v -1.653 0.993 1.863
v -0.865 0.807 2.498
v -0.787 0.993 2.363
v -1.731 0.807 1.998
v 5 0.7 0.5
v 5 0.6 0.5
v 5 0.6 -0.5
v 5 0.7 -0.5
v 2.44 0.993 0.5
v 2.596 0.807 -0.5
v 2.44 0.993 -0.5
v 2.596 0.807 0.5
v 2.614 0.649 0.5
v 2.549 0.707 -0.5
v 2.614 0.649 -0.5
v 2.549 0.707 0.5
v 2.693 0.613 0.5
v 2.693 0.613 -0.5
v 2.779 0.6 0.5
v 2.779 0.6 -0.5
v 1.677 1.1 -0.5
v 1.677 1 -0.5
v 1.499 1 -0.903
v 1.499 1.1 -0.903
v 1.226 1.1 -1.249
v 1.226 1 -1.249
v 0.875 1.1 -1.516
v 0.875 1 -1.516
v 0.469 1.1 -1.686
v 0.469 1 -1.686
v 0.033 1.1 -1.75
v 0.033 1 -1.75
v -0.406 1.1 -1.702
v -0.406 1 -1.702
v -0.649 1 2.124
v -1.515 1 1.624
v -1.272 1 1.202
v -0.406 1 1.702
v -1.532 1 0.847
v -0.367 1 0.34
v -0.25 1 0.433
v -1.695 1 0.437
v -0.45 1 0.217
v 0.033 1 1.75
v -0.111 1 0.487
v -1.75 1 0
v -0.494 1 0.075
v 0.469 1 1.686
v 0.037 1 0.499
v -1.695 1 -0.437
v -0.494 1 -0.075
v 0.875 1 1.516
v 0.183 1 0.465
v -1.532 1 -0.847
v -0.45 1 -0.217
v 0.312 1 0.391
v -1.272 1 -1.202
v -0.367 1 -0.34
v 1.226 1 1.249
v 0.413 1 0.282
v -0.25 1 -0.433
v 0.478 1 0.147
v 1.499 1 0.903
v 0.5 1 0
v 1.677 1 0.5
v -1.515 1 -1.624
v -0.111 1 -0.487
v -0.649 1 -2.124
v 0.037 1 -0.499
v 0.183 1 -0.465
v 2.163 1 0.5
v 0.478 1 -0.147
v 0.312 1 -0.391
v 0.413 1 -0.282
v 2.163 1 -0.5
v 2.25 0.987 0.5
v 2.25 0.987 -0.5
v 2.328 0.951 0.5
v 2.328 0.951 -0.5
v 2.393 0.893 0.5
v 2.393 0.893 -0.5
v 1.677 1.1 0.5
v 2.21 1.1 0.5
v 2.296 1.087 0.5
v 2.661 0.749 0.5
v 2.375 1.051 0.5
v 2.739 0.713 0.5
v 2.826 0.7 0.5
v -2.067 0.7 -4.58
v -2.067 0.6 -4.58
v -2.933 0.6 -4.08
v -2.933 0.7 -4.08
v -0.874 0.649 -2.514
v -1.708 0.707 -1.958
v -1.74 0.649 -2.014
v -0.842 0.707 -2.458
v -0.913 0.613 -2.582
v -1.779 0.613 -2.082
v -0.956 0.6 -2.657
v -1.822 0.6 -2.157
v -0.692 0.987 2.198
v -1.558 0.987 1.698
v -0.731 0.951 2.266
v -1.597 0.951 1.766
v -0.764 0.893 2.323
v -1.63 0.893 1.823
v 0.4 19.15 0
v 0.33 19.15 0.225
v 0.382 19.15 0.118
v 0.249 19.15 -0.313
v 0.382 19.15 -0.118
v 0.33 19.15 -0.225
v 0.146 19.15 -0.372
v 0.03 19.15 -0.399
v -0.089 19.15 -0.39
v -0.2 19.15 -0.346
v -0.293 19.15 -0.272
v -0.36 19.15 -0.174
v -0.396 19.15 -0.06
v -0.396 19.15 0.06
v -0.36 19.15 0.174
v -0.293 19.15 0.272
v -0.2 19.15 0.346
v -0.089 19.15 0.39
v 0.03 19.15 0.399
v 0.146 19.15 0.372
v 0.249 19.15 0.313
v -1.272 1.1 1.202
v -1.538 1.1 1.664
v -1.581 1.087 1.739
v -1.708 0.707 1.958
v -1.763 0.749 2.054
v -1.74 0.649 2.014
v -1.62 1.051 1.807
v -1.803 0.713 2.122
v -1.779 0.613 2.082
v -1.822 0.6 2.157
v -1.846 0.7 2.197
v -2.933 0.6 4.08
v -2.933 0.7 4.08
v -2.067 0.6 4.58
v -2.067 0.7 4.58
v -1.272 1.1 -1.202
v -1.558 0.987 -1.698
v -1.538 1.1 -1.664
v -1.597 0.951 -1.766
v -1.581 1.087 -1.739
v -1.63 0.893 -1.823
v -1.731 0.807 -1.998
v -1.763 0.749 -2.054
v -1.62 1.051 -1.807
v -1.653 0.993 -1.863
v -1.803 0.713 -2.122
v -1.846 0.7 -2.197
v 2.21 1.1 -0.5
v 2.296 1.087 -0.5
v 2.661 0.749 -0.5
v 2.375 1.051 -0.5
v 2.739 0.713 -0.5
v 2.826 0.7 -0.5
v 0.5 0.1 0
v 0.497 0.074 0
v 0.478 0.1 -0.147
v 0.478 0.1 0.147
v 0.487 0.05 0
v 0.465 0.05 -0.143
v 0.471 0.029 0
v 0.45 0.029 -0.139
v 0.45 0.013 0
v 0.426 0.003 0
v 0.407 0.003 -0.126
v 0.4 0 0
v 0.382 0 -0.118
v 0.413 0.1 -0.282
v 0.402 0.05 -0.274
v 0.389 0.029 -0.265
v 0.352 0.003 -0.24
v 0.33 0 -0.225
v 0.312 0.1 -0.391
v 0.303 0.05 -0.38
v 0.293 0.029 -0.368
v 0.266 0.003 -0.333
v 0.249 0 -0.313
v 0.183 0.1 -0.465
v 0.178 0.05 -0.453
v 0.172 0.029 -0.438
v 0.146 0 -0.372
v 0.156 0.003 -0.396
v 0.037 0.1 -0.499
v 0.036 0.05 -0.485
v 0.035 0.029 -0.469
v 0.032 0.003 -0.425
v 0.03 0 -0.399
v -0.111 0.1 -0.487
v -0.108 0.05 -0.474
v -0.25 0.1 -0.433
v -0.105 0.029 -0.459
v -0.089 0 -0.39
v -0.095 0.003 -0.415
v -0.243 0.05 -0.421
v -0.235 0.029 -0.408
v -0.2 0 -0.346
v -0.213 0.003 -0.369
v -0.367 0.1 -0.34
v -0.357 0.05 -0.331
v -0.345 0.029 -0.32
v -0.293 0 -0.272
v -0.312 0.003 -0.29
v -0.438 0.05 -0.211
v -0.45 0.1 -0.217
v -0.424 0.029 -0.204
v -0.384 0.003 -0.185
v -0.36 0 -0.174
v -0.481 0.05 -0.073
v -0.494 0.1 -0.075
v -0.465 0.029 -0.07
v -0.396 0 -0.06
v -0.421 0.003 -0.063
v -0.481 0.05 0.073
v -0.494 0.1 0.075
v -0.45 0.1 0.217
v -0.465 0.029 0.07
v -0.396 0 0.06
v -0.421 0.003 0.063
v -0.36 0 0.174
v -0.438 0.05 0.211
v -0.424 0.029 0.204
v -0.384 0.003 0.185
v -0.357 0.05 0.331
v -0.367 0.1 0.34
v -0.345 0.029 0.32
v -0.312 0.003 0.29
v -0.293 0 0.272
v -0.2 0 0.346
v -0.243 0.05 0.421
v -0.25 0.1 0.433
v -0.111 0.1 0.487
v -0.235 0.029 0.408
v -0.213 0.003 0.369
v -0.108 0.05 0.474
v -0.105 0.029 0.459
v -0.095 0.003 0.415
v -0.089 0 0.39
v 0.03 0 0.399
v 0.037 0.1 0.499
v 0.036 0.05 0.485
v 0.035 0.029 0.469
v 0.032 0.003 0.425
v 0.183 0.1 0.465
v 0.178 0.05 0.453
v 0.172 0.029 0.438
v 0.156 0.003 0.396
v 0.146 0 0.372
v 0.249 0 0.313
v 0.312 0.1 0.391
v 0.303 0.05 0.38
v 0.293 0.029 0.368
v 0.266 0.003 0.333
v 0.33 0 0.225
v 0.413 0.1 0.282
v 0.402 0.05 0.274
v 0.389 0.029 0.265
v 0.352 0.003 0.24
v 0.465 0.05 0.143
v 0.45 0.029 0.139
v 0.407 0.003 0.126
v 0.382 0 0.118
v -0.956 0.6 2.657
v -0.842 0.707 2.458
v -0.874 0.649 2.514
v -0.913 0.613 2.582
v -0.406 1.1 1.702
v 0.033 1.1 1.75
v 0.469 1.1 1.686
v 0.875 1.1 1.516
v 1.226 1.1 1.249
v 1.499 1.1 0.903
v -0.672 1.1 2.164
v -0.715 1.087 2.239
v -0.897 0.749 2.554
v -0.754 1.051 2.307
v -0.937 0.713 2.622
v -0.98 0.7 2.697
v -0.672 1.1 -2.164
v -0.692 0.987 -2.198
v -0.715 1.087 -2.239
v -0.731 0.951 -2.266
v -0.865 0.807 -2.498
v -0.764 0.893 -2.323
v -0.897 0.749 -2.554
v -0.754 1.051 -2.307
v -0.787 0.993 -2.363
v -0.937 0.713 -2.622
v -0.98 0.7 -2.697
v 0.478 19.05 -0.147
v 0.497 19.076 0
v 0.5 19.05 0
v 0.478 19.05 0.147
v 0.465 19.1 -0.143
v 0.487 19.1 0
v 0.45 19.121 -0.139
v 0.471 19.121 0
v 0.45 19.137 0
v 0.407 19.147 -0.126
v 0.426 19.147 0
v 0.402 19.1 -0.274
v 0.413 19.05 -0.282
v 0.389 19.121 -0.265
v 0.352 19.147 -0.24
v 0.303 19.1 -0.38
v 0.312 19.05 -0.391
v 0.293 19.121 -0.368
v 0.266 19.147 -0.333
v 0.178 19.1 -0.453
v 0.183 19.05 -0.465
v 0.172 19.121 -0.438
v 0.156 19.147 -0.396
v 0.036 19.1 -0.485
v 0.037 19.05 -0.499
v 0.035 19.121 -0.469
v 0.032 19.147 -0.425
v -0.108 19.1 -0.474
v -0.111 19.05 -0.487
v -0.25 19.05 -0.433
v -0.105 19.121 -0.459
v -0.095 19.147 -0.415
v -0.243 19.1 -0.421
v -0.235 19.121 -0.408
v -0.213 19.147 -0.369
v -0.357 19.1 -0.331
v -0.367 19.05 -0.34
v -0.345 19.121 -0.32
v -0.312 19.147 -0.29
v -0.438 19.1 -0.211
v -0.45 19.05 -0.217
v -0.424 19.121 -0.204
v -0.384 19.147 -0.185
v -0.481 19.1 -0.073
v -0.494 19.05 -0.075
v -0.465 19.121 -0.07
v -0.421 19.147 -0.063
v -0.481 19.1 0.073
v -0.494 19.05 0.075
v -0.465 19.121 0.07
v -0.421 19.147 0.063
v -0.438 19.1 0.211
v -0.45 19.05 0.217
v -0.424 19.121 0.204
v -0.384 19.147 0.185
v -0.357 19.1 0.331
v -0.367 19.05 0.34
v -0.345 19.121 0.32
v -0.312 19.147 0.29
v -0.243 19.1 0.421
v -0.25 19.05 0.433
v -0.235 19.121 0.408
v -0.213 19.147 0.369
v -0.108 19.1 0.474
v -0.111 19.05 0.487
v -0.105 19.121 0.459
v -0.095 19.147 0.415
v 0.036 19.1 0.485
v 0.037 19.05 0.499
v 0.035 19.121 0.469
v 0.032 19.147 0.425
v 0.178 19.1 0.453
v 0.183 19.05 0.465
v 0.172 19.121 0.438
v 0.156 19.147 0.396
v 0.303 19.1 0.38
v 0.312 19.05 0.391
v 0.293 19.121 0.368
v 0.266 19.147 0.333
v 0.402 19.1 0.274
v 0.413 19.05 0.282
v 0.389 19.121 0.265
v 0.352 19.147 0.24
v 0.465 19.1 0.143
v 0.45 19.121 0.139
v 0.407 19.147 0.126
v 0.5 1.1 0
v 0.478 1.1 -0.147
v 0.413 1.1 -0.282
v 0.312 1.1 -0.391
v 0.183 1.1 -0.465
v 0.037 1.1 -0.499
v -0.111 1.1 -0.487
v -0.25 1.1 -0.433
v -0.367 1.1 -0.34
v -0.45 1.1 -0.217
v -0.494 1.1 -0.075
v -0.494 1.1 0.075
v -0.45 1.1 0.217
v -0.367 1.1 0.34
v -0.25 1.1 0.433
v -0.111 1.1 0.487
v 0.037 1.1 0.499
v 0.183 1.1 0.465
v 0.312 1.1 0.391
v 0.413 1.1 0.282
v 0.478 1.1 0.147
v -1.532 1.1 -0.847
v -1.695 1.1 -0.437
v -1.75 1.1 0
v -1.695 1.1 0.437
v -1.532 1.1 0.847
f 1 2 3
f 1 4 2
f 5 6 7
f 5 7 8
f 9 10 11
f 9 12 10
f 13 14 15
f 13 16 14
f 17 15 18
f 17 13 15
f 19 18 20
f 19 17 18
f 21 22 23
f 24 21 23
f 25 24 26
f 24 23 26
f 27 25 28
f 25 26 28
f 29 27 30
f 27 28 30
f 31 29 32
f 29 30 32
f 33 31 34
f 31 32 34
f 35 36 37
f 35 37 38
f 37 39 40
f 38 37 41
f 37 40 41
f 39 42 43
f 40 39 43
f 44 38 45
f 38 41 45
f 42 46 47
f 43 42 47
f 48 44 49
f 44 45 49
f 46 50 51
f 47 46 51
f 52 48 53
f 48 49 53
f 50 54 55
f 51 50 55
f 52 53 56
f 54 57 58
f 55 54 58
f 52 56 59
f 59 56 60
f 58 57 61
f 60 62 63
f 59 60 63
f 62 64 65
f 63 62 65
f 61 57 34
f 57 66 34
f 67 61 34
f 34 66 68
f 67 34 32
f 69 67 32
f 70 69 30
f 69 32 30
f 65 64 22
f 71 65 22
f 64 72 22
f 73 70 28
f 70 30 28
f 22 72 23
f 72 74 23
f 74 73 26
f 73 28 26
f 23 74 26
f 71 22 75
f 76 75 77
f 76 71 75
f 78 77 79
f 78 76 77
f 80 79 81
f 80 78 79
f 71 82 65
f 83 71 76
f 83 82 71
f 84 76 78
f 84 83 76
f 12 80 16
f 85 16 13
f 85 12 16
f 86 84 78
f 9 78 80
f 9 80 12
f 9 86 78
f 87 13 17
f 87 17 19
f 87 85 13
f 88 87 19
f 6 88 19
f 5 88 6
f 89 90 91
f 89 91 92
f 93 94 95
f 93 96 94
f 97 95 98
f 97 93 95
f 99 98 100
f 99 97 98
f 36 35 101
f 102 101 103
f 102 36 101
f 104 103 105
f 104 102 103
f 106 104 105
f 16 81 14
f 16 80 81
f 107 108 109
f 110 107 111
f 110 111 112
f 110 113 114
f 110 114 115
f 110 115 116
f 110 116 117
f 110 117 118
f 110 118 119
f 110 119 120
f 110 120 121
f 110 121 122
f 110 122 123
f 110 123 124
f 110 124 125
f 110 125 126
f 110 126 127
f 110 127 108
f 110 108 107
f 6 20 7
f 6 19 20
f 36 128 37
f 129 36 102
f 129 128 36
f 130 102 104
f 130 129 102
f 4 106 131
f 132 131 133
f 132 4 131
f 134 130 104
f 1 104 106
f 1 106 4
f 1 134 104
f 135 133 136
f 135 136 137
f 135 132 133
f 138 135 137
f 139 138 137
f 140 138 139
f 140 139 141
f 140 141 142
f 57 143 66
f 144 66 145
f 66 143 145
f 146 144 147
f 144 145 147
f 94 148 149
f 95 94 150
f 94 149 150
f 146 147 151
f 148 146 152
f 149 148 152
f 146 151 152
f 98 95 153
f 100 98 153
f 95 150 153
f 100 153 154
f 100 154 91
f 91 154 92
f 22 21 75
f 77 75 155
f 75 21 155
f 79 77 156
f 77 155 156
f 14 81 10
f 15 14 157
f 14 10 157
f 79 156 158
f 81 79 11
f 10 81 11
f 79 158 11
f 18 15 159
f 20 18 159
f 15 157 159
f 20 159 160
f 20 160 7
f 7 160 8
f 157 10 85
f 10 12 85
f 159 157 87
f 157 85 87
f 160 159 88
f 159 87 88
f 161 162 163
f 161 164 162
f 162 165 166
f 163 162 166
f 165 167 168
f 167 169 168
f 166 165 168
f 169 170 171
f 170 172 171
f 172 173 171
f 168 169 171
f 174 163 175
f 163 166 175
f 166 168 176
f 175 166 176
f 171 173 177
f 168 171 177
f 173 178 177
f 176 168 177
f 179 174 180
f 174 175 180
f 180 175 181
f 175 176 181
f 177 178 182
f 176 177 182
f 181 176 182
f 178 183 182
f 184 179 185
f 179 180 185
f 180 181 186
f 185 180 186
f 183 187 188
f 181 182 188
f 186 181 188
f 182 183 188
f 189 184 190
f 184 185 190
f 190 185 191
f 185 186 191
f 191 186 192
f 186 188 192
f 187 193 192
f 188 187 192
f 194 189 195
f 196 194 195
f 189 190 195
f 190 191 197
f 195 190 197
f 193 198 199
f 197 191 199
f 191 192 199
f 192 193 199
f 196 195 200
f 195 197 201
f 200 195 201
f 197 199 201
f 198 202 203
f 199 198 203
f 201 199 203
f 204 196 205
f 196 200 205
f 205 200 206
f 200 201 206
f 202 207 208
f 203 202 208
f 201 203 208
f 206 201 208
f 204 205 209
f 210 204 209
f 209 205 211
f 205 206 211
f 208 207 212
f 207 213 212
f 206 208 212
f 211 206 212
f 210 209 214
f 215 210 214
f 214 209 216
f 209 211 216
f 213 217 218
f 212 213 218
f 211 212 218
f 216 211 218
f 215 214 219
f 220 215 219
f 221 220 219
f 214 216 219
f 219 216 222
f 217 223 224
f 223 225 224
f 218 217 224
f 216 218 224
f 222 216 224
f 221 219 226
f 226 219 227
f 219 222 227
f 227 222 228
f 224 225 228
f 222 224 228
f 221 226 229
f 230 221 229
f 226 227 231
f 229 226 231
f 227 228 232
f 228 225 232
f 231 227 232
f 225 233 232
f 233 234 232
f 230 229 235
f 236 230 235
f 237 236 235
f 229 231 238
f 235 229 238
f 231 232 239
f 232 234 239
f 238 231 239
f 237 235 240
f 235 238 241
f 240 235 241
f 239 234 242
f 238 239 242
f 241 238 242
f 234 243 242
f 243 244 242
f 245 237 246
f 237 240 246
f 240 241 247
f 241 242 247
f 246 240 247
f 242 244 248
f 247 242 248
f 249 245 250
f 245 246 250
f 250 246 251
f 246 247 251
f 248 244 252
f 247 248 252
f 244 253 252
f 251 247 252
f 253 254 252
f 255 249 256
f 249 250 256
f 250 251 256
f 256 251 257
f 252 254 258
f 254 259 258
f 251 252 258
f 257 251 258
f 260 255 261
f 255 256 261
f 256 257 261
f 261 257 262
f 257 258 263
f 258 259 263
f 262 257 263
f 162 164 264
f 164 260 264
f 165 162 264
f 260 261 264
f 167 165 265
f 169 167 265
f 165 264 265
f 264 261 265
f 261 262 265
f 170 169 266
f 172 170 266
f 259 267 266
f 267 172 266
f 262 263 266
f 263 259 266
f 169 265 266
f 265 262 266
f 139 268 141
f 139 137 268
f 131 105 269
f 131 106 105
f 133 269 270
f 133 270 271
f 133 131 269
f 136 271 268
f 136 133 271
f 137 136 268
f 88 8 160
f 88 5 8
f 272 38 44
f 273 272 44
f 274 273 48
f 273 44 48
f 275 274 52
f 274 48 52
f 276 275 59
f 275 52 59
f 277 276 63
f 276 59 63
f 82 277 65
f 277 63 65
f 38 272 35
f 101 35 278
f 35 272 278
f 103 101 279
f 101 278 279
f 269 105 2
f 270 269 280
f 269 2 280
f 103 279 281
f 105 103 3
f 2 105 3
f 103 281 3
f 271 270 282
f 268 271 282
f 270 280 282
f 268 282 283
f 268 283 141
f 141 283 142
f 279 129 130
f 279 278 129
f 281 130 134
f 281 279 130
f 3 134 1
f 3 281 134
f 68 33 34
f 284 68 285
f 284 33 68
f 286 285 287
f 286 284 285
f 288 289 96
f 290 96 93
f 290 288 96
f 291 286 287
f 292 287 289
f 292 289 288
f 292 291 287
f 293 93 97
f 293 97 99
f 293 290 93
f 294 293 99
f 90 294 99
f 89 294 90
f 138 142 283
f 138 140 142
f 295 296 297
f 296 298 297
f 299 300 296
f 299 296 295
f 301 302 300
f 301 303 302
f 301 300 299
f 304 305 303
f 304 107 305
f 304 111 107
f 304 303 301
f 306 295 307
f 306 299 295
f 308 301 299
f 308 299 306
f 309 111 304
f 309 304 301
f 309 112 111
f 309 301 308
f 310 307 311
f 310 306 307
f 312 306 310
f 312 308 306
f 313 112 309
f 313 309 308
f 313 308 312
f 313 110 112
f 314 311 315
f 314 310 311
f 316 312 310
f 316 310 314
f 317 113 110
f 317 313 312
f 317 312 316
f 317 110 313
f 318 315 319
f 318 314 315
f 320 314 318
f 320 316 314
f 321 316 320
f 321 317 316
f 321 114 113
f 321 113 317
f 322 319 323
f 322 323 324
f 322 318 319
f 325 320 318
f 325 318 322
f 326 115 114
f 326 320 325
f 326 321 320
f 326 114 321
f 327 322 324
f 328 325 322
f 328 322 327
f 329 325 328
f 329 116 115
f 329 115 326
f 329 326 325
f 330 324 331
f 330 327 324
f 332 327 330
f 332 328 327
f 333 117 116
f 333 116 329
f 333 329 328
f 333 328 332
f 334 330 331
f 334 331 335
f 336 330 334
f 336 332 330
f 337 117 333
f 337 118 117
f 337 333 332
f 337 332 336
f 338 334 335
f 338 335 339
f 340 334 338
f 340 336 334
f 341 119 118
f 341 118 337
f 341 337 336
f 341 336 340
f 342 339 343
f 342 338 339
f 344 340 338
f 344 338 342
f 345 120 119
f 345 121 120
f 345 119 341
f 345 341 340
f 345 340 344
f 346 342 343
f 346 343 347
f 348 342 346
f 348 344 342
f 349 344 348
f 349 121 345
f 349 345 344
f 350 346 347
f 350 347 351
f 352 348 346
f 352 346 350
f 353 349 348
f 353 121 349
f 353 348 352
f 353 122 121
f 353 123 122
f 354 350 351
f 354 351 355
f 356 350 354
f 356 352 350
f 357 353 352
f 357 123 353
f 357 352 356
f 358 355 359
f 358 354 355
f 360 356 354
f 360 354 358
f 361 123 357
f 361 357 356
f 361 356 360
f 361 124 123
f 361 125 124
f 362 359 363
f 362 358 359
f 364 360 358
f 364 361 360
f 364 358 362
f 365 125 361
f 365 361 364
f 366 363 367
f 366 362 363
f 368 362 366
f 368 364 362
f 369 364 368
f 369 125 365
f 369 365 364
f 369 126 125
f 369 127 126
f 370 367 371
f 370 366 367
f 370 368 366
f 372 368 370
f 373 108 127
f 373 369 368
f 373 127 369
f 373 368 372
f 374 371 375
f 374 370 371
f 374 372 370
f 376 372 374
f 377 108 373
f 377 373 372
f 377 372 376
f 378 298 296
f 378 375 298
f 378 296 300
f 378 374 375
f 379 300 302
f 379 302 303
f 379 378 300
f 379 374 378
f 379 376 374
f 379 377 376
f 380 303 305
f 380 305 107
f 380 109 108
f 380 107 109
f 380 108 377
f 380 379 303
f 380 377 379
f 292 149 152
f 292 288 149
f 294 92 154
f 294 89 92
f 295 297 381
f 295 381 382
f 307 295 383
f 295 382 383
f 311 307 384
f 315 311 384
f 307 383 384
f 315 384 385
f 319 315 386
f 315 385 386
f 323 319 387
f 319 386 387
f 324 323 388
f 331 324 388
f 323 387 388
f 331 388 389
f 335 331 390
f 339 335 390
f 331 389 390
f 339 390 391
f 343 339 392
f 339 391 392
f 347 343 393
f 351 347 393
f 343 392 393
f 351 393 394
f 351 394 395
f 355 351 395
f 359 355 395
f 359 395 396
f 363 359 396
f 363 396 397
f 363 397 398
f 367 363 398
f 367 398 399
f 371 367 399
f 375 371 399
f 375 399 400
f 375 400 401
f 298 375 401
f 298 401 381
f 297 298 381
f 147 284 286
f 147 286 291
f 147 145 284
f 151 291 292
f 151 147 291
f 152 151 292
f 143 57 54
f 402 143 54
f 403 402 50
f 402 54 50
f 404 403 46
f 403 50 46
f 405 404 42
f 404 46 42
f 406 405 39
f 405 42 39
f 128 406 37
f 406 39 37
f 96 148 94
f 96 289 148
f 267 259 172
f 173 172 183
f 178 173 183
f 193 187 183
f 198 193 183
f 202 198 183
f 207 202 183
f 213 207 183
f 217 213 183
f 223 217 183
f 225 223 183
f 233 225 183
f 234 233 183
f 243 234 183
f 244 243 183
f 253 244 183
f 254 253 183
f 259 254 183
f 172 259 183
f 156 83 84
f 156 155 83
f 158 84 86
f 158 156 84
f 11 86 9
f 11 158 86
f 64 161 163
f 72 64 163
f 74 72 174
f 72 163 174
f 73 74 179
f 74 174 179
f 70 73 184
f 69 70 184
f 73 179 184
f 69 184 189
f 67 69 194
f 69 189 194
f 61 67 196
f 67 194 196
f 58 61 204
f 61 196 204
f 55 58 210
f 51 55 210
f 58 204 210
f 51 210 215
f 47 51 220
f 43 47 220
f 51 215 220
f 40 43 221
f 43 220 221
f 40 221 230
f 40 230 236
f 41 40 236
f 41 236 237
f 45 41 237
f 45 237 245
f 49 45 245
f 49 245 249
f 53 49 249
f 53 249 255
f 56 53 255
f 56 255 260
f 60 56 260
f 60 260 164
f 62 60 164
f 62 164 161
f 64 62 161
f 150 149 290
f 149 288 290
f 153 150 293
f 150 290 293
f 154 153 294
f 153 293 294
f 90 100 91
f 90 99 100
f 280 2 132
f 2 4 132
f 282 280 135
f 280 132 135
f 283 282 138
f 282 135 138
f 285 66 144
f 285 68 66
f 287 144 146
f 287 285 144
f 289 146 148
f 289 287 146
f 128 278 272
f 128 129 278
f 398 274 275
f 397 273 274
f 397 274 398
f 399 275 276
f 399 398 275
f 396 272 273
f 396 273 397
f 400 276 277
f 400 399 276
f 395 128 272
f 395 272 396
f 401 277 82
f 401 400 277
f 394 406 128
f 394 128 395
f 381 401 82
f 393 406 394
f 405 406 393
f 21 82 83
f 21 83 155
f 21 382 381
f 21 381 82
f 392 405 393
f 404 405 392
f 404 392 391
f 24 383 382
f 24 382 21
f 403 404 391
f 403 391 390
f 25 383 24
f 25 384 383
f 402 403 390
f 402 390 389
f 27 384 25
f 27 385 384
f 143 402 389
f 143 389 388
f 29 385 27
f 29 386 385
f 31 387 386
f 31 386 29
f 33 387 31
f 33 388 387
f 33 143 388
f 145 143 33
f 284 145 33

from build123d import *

# Parameters (mm, degrees)
SKETCH_1_R               = 0.5
EXTRUDE_1_DEPTH          = 19.15
SKETCH_2_R               = 1.75
SKETCH_2_R_2             = 0.5
EXTRUDE_2_DEPTH          = 0.1
EXTRUDE_3_DEPTH          = 0.5
PATTERN_CIRCULAR_1_COUNT = 3
FILLET_2_R               = 0.3
FILLET_3_R               = 0.1


with BuildPart() as part:
    # Эскиз1 → Бобышка-Вытянуть1 (new body)
    with BuildSketch(Plane(origin=(0, 0, 0), x_dir=(1, 0, 0), z_dir=(0, 1, 0))):
        Circle(SKETCH_1_R)
    extrude(amount=EXTRUDE_1_DEPTH)

    # Эскиз2 → Бобышка-Вытянуть2 (add)
    with BuildSketch(Plane(origin=(0, 1, 0), x_dir=(1, 0, 0), z_dir=(0, 1, 0))):
        Circle(SKETCH_2_R)
        Circle(SKETCH_2_R_2, mode=Mode.SUBTRACT)
    extrude(amount=EXTRUDE_2_DEPTH)

    # Эскиз3 → Бобышка-Вытянуть3 (add, symmetric)
    with BuildSketch(Plane.XY):
        Polygon((1.5, 1), (2.303369234, 1), (2.639009087, 0.6), (5, 0.6), (5, 0.7), (2.685639852, 0.7), (2.35, 1.1), (1.5, 1.1), align=None)
    extrude_3 = extrude(amount=EXTRUDE_3_DEPTH, both=True)

    # Круговой массив1: Бобышка-Вытянуть3 ×3 about axis
    pattern_circular_1_axis = Axis((0, 0, 0), (0, 1, 0))
    for i in range(1, PATTERN_CIRCULAR_1_COUNT):
        add(extrude_3.rotate(pattern_circular_1_axis, i * 360 / PATTERN_CIRCULAR_1_COUNT))

    # Скругление2
    fillet_2_edges = [part.edges().sort_by_distance(p)[0] for p in [
        (2.303369234, 1, 0),
        (2.639009087, 0.6, 0),
        (2.685639852, 0.7, 0),
        (2.35, 1.1, 0),
        (-1.151684617, 1, -1.994776271),
        (-1.319504543, 0.6, -2.28544891),
        (-1.342819926, 0.7, -2.325832338),
        (-1.175, 1.1, -2.035159699),
        (-1.151684617, 1, 1.994776271),
        (-1.319504543, 0.6, 2.28544891),
        (-1.342819926, 0.7, 2.325832338),
        (-1.175, 1.1, 2.035159699),
    ]]
    fillet(fillet_2_edges, radius=FILLET_2_R)

    # Скругление3
    fillet_3_edges = [part.edges().sort_by_distance(p)[0] for p in [
        (-0.5, 0, 0),
        (-0.5, 19.15, 0),
    ]]
    fillet(fillet_3_edges, radius=FILLET_3_R)


solid = part.part
